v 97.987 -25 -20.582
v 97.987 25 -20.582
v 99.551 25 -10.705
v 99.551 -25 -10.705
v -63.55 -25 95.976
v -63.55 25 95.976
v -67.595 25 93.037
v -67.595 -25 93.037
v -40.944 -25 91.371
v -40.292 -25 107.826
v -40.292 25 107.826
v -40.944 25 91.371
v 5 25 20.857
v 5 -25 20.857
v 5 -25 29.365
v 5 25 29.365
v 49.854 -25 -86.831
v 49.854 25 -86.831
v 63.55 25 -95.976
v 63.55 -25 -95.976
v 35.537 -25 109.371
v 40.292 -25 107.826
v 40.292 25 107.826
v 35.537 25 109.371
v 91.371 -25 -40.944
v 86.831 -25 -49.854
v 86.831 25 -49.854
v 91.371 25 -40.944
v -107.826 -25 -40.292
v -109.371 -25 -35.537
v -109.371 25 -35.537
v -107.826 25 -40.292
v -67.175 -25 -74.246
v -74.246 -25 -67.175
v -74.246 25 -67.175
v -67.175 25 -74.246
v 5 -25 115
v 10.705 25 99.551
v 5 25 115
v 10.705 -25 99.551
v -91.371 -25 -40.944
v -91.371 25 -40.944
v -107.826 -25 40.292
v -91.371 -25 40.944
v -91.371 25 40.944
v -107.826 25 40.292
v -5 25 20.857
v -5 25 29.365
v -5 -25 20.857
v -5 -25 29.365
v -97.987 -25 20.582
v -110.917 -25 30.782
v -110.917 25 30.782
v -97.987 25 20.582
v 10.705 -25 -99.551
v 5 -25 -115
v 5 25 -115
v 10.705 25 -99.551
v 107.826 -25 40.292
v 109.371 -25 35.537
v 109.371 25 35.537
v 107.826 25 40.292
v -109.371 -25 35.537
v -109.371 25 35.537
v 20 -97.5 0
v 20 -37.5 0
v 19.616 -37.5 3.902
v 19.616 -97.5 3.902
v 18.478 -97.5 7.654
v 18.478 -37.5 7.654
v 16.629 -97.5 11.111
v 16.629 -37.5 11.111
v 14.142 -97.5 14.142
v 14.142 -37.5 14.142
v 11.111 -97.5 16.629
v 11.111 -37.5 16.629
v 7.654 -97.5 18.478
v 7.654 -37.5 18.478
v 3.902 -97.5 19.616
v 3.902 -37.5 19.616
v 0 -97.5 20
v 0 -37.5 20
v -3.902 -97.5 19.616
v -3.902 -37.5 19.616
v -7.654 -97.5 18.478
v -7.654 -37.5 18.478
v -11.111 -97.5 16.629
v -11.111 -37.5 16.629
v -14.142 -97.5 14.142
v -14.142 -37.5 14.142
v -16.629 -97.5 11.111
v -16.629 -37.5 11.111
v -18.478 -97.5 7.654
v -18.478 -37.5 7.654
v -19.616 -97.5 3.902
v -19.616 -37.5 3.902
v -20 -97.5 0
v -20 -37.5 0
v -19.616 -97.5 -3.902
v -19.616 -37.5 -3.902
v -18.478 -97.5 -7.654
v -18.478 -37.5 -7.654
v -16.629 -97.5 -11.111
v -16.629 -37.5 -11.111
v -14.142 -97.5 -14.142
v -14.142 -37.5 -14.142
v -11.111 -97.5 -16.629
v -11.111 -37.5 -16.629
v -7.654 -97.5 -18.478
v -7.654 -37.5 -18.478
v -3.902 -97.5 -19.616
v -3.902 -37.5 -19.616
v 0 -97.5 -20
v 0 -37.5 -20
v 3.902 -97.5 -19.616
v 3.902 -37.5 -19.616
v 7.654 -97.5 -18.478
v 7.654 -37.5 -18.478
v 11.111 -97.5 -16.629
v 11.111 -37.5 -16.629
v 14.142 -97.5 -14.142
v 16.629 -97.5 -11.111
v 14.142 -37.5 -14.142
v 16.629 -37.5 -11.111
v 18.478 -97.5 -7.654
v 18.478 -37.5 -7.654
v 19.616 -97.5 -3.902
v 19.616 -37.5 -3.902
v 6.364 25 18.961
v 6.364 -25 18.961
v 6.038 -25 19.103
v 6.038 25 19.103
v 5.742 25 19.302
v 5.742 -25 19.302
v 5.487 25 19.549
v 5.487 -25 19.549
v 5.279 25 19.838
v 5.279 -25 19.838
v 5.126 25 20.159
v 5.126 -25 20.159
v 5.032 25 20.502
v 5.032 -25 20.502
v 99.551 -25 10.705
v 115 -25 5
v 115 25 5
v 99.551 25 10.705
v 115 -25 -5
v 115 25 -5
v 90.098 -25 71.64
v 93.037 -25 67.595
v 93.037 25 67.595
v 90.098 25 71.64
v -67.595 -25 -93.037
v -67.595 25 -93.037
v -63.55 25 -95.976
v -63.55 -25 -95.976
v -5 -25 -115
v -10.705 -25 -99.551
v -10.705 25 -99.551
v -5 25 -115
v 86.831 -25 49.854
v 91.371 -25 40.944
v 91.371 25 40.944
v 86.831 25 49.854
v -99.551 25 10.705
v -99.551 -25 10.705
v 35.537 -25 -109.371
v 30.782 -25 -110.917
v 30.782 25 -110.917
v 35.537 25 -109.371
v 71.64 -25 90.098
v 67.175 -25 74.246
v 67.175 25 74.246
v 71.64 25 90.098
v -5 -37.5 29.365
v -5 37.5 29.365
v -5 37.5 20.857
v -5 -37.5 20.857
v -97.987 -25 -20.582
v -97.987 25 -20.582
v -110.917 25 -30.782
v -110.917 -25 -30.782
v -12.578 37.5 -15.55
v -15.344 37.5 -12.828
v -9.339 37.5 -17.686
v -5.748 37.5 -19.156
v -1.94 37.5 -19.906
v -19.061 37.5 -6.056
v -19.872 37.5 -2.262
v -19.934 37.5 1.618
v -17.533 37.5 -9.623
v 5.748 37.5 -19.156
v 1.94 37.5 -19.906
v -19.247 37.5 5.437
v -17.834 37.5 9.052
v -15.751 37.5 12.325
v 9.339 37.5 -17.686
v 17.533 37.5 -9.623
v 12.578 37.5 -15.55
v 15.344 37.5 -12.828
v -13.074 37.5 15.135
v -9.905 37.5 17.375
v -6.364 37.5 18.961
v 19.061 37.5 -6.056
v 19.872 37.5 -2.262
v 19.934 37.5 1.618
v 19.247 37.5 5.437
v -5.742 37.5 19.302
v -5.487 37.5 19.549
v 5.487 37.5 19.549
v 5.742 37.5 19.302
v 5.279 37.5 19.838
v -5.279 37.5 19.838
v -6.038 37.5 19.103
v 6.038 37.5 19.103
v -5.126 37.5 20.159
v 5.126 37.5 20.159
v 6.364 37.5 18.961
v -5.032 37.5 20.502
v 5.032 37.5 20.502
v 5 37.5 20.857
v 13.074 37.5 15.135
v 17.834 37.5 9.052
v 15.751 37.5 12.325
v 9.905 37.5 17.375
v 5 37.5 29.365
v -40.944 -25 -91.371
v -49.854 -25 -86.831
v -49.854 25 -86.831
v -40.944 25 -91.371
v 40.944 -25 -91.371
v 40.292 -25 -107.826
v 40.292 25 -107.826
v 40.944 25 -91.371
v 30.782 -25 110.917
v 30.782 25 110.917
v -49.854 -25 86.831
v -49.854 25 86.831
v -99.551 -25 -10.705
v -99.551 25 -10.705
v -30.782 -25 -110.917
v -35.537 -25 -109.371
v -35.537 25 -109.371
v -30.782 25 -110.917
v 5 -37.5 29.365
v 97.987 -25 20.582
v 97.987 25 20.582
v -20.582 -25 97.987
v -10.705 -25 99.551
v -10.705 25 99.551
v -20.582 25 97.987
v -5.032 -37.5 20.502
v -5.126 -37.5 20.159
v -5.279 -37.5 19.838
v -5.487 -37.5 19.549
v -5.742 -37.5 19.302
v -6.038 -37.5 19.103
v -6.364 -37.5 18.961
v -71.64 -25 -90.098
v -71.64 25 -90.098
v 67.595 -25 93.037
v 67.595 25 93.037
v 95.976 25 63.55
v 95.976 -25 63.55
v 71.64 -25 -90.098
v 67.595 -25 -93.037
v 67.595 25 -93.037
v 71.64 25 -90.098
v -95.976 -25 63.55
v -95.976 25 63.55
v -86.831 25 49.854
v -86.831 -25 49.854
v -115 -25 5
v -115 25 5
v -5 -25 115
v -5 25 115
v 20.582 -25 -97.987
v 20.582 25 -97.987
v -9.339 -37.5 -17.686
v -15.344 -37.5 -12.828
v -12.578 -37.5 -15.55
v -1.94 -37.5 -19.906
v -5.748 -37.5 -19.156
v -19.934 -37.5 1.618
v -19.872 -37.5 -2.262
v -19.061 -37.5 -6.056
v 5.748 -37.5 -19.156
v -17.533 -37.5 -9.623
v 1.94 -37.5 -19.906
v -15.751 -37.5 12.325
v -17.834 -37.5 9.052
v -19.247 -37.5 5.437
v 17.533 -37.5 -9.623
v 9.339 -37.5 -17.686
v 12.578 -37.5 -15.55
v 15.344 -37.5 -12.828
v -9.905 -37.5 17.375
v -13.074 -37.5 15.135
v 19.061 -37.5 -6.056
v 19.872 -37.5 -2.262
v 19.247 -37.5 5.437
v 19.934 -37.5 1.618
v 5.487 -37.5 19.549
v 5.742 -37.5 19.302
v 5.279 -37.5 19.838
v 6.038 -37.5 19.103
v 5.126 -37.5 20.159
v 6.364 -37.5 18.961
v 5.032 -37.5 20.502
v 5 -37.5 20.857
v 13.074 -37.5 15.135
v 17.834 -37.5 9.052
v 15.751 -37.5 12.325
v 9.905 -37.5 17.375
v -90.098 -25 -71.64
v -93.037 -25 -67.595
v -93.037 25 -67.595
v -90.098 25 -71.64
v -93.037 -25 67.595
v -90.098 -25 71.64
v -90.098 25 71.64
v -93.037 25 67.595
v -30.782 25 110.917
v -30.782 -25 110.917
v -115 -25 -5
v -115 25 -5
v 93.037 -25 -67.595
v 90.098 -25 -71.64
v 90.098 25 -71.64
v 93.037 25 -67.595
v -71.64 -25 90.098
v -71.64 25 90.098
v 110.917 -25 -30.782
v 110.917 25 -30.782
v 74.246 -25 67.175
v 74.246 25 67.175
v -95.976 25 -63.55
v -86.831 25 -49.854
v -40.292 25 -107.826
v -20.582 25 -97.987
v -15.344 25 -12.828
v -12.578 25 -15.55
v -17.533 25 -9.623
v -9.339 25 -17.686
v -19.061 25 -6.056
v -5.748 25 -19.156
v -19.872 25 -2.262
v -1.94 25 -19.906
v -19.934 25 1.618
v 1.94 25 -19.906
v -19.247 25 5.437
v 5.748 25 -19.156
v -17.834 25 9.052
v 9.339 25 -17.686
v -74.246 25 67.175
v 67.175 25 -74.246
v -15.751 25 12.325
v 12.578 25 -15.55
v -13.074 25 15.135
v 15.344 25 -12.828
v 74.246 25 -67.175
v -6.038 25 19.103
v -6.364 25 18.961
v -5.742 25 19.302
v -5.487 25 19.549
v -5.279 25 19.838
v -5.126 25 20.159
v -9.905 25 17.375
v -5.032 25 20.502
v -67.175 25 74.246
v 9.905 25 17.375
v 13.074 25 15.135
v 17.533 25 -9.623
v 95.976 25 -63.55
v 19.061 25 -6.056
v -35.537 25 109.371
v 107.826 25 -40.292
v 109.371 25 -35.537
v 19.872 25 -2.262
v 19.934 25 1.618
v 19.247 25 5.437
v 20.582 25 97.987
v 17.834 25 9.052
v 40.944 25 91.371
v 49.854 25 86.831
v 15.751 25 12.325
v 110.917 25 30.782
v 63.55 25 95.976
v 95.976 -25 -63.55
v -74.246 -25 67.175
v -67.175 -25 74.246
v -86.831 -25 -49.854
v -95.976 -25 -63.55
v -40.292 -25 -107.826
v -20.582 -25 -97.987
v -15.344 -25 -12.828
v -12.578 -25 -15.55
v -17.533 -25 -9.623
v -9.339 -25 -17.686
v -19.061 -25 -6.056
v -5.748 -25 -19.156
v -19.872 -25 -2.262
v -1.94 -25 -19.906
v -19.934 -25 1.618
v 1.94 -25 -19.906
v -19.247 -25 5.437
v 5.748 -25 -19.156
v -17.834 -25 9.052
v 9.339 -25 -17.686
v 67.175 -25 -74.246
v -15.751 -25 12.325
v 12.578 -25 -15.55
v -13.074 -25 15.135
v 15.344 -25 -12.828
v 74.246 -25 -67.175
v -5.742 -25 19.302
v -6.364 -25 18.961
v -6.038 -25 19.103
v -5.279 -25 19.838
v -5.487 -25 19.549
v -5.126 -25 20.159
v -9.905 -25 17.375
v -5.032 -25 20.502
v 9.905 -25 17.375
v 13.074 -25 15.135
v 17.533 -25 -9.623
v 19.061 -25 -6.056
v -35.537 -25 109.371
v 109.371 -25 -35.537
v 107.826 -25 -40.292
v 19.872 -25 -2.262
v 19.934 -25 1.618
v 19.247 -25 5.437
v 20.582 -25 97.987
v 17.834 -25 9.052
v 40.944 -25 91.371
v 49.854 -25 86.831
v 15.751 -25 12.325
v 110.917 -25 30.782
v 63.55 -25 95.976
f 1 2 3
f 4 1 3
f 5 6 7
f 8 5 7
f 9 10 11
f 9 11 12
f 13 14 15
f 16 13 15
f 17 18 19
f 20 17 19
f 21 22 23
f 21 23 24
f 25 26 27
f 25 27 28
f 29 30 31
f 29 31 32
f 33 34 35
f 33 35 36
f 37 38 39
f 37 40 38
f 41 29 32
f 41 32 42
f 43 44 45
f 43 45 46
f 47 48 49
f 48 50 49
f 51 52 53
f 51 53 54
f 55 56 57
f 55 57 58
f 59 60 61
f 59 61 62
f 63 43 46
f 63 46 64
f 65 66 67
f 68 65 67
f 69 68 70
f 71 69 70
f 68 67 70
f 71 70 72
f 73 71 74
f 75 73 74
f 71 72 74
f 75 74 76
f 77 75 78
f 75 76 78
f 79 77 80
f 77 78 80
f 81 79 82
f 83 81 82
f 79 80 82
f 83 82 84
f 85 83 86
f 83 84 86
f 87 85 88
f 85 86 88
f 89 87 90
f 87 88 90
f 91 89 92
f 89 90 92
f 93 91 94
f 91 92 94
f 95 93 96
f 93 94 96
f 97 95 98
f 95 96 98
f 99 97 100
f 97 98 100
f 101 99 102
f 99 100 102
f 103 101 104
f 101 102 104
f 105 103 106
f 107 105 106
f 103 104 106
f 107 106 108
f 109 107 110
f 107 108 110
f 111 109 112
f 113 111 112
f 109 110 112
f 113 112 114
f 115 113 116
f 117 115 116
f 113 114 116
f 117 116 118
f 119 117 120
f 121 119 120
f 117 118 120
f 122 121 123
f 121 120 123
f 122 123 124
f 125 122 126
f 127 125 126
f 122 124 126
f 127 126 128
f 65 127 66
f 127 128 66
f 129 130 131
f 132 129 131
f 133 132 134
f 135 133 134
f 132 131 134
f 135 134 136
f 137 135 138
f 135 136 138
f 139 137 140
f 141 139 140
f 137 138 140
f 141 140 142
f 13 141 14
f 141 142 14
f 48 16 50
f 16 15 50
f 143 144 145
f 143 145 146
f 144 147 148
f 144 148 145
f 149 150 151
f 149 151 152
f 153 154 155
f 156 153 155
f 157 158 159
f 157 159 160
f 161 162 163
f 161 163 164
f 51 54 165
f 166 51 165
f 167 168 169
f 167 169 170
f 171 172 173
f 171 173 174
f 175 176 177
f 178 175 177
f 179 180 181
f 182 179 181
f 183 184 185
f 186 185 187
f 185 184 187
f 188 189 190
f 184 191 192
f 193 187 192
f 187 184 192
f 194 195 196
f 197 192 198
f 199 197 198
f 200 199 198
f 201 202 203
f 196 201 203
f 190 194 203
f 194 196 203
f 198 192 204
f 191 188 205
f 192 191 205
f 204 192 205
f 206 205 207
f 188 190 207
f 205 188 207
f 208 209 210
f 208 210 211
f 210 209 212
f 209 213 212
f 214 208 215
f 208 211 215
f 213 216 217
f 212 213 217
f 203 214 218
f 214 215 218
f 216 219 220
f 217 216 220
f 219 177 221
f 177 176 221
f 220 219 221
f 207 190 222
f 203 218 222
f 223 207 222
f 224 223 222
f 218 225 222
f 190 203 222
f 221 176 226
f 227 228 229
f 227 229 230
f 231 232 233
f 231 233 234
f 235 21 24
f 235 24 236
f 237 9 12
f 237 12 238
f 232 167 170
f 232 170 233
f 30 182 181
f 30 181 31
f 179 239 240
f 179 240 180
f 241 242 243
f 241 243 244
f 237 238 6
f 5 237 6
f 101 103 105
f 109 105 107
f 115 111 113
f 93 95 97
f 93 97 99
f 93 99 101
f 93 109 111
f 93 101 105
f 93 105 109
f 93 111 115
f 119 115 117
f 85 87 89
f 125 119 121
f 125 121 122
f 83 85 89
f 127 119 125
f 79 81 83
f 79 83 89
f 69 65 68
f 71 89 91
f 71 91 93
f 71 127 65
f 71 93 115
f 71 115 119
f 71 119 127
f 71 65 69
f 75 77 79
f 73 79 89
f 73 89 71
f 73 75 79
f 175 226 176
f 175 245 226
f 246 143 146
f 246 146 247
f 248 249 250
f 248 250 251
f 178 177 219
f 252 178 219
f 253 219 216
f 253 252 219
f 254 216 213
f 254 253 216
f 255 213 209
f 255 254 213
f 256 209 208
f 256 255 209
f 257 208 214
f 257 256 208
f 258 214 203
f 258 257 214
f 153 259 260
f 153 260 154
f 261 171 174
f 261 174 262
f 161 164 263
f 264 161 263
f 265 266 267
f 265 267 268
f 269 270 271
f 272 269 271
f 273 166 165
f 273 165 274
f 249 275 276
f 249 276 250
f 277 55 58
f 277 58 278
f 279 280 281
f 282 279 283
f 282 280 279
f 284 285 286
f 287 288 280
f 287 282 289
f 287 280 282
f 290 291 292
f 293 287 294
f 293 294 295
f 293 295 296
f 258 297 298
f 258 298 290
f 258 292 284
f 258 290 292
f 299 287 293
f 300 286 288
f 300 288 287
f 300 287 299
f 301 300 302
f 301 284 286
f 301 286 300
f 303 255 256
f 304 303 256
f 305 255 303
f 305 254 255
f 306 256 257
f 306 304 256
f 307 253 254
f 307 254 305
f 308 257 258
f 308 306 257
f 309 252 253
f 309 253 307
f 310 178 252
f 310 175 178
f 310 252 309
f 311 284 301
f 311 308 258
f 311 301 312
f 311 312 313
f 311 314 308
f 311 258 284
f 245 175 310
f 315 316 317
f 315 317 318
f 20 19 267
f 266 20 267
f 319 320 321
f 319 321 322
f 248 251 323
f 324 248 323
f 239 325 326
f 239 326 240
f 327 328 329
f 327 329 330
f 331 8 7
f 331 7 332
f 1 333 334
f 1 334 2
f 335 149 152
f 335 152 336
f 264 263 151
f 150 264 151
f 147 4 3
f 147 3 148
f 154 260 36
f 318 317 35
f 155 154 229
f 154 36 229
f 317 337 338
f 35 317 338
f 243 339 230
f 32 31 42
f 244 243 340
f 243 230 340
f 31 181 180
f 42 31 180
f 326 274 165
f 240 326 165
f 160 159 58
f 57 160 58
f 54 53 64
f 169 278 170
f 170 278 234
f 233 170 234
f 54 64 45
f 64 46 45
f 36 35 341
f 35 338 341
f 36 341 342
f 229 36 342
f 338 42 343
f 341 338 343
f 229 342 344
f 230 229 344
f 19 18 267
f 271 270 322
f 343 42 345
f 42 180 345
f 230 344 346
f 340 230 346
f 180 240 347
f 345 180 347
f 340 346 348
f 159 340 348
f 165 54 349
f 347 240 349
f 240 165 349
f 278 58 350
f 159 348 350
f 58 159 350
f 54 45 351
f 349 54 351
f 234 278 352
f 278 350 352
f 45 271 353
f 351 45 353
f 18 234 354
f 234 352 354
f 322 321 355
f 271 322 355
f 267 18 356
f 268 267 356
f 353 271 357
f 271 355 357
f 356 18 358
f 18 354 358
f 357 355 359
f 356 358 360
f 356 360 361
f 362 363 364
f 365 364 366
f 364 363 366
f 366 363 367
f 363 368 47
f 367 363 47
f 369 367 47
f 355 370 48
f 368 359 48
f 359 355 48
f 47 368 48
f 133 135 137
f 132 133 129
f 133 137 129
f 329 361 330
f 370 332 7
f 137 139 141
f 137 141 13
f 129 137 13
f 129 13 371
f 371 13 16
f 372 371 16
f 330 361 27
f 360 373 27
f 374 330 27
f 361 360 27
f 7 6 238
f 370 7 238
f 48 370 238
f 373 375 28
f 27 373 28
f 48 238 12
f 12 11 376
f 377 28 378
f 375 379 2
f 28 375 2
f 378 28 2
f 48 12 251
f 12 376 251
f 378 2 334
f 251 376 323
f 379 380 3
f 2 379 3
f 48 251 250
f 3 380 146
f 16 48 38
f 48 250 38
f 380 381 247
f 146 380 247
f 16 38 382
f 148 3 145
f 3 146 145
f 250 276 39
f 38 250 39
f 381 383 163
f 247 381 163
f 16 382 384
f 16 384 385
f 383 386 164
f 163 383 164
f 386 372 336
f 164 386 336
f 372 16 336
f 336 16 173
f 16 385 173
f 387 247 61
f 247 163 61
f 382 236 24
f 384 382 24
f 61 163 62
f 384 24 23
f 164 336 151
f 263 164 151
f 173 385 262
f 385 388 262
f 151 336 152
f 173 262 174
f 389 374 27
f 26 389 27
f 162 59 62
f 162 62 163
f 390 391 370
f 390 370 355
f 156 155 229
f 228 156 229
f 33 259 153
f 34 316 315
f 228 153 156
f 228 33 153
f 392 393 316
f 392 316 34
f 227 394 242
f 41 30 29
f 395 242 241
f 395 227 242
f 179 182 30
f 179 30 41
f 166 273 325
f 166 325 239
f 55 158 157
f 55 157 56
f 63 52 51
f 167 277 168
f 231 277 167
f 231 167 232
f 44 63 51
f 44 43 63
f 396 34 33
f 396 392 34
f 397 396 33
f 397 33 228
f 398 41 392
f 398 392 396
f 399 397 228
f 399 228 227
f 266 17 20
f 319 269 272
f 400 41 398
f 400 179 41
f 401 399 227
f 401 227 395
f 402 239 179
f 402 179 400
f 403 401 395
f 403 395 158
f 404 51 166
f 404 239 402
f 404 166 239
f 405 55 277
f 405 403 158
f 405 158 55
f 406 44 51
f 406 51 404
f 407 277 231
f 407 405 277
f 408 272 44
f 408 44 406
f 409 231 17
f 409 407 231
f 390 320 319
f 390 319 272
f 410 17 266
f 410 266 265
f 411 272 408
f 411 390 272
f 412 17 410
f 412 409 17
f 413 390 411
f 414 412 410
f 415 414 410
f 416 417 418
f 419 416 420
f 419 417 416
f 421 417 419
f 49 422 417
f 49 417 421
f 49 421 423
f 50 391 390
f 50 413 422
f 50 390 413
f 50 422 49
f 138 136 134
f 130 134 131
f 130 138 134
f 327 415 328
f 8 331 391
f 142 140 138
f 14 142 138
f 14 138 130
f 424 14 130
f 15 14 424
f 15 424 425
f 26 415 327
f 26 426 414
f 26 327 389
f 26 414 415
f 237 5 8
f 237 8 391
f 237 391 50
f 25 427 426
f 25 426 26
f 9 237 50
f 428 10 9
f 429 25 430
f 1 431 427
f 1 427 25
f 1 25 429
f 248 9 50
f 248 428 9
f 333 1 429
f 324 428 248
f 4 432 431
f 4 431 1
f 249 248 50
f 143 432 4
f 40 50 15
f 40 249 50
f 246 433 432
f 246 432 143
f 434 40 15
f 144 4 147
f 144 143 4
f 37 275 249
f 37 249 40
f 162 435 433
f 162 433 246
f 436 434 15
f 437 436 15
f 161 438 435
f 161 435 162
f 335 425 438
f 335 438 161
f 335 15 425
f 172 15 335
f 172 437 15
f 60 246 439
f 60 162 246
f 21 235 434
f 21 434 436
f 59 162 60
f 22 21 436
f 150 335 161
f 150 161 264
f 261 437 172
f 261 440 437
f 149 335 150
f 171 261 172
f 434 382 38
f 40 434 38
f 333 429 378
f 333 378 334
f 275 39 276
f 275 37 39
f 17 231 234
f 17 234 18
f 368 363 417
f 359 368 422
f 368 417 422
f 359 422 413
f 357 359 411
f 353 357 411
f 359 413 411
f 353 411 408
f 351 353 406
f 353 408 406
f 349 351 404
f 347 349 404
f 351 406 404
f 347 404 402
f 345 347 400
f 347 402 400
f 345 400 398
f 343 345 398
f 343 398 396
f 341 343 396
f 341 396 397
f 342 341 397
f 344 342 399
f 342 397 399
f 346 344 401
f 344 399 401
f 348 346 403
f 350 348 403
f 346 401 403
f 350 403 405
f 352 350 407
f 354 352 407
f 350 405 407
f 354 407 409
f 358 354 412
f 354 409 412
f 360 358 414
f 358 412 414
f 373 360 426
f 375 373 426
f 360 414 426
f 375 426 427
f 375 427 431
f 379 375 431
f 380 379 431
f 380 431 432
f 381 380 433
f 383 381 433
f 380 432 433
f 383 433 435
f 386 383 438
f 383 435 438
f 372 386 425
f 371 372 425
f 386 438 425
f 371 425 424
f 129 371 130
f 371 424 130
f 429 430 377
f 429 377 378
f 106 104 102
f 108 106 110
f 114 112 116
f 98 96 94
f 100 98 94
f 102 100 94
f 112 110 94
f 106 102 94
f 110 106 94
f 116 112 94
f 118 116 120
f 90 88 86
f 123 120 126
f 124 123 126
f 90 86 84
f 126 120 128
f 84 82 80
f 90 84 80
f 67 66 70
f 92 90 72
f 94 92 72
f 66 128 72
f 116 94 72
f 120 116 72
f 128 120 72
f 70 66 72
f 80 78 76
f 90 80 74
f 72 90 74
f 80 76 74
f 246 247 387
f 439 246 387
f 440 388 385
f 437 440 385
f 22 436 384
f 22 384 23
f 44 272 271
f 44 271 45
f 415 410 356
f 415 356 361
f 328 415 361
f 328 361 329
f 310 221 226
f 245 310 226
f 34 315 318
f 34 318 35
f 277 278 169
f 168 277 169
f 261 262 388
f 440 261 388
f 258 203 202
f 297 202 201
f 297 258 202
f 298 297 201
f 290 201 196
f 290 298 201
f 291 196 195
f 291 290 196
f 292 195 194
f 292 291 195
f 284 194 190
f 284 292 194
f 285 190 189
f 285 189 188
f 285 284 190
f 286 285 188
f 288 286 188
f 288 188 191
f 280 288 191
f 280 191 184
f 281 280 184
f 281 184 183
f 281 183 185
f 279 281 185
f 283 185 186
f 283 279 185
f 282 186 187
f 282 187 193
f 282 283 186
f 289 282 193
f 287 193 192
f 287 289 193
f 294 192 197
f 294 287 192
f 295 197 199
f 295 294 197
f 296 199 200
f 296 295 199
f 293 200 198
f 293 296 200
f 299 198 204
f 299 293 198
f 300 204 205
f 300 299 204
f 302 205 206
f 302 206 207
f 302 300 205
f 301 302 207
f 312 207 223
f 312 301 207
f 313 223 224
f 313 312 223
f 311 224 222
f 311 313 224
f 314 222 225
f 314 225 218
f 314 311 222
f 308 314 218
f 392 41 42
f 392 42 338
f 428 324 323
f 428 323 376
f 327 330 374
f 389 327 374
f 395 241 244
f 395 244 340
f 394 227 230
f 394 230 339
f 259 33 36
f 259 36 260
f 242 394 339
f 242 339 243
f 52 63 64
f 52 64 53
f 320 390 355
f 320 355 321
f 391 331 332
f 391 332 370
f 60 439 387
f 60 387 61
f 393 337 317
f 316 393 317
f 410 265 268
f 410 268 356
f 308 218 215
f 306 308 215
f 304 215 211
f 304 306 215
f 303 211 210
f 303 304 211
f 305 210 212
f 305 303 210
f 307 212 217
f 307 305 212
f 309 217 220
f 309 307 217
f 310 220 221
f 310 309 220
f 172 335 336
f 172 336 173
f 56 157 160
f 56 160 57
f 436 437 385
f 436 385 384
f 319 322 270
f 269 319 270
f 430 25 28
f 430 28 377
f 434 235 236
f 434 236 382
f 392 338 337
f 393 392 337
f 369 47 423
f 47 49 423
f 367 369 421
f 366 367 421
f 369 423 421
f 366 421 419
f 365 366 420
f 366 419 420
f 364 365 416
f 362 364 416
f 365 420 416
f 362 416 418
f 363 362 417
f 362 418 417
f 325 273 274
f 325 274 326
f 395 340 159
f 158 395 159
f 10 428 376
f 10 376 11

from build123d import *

# Parameters (mm, degrees)
F1_DEPTH = 25
F3_DEPTH = 25
F4_DEPTH = 37.5
F5_R     = 20
F6_DEPTH = 60


with BuildPart() as f1:
    # F0 (on Front) → F1 (new body, symmetric)
    with BuildSketch(Plane.XZ):
        Polygon((5, 115), (0, 115), (-5, 115), (-10.705004801, 99.5510063847), (-20.581888207, 97.9866617343), (-30.7816717716, 110.9165843458), (-35.5369543531, 109.3714993739), (-40.2922369346, 107.8264144021), (-40.944017353, 91.3706049175), (-49.8540825949, 86.8306999201), (-63.5502190418, 95.9758806146), (-67.5953040136, 93.0369543531), (-71.6403889855, 90.0980280917), (-67.1751442127, 74.2462120246), (-74.2462120246, 67.1751442127), (-90.0980280917, 71.6403889855), (-93.0369543531, 67.5953040136), (-95.9758806146, 63.5502190418), (-86.8306999201, 49.8540825949), (-91.3706049175, 40.944017353), (-107.8264144021, 40.2922369346), (-109.3714993739, 35.5369543531), (-110.9165843458, 30.7816717716), (-97.9866617343, 20.581888207), (-99.5510063847, 10.705004801), (-115, 5), (-115, 0), (-115, -5), (-99.5510063847, -10.705004801), (-97.9866617343, -20.581888207), (-110.9165843458, -30.7816717716), (-109.3714993739, -35.5369543531), (-107.8264144021, -40.2922369346), (-91.3706049175, -40.944017353), (-86.8306999201, -49.8540825949), (-95.9758806146, -63.5502190418), (-93.0369543531, -67.5953040136), (-90.0980280917, -71.6403889855), (-74.2462120246, -67.1751442127), (-67.1751442127, -74.2462120246), (-71.6403889855, -90.0980280917), (-67.5953040136, -93.0369543531), (-63.5502190418, -95.9758806146), (-49.8540825949, -86.8306999201), (-40.944017353, -91.3706049175), (-40.2922369346, -107.8264144021), (-35.5369543531, -109.3714993739), (-30.7816717716, -110.9165843458), (-20.581888207, -97.9866617343), (-10.705004801, -99.5510063847), (-5, -115), (0, -115), (5, -115), (10.705004801, -99.5510063847), (20.581888207, -97.9866617343), (30.7816717716, -110.9165843458), (35.5369543531, -109.3714993739), (40.2922369346, -107.8264144021), (40.944017353, -91.3706049175), (49.8540825949, -86.8306999201), (63.5502190418, -95.9758806146), (67.5953040136, -93.0369543531), (71.6403889855, -90.0980280917), (67.1751442127, -74.2462120246), (74.2462120246, -67.1751442127), (90.0980280917, -71.6403889855), (93.0369543531, -67.5953040136), (95.9758806146, -63.5502190418), (86.8306999201, -49.8540825949), (91.3706049175, -40.944017353), (107.8264144021, -40.2922369346), (109.3714993739, -35.5369543531), (110.9165843458, -30.7816717716), (97.9866617343, -20.581888207), (99.5510063847, -10.705004801), (115, -5), (115, 0), (115, 5), (99.5510063847, 10.705004801), (97.9866617343, 20.581888207), (110.9165843458, 30.7816717716), (109.3714993739, 35.5369543531), (107.8264144021, 40.2922369346), (91.3706049175, 40.944017353), (86.8306999201, 49.8540825949), (95.9758806146, 63.5502190418), (93.0369543531, 67.5953040136), (90.0980280917, 71.6403889855), (74.2462120246, 67.1751442127), (67.1751442127, 74.2462120246), (71.6403889855, 90.0980280917), (67.5953040136, 93.0369543531), (63.5502190418, 95.9758806146), (49.8540825949, 86.8306999201), (40.944017353, 91.3706049175), (40.2922369346, 107.8264144021), (35.5369543531, 109.3714993739), (30.7816717716, 110.9165843458), (20.581888207, 97.9866617343), (10.705004801, 99.5510063847), align=None)
    extrude(amount=F1_DEPTH, both=True)

    # F2 (on Front) → F3 (cut, symmetric)
    with BuildSketch(Plane.XZ):
        with BuildLine():
            ThreePointArc((-5, 20.8566536146), (-5.3763117182, 19.6889051984), (-6.3636363636, 18.9605941951))
            ThreePointArc((-6.3636363636, 18.9605941951), (0, -20), (6.3636363636, 18.9605941951))
            ThreePointArc((6.3636363636, 18.9605941951), (5.3763117182, 19.6889051984), (5, 20.8566536146))
            Line((5, 20.8566536146), (5, 29.364916731))
            Line((5, 29.364916731), (-5, 29.364916731))
            Line((-5, 29.364916731), (-5, 20.8566536146))
        make_face()
    extrude(amount=F3_DEPTH, both=True, mode=Mode.SUBTRACT)


with BuildPart() as f4:
    # F2 (on Front) → F4 (new body, symmetric)
    with BuildSketch(Plane.XZ):
        with BuildLine():
            ThreePointArc((-5, 20.8566536146), (-5.3763117182, 19.6889051984), (-6.3636363636, 18.9605941951))
            ThreePointArc((-6.3636363636, 18.9605941951), (0, -20), (6.3636363636, 18.9605941951))
            ThreePointArc((6.3636363636, 18.9605941951), (5.3763117182, 19.6889051984), (5, 20.8566536146))
            Line((5, 20.8566536146), (5, 29.364916731))
            Line((5, 29.364916731), (-5, 29.364916731))
            Line((-5, 29.364916731), (-5, 20.8566536146))
        make_face()
    extrude(amount=F4_DEPTH, both=True)


with BuildPart() as f6:
    # F5 (on face) → F6 (new body)
    with BuildSketch(Plane.XZ.offset(37.5)):
        Circle(F5_R)
    extrude(amount=F6_DEPTH)


solid = Compound([f1.part, f4.part, f6.part])
